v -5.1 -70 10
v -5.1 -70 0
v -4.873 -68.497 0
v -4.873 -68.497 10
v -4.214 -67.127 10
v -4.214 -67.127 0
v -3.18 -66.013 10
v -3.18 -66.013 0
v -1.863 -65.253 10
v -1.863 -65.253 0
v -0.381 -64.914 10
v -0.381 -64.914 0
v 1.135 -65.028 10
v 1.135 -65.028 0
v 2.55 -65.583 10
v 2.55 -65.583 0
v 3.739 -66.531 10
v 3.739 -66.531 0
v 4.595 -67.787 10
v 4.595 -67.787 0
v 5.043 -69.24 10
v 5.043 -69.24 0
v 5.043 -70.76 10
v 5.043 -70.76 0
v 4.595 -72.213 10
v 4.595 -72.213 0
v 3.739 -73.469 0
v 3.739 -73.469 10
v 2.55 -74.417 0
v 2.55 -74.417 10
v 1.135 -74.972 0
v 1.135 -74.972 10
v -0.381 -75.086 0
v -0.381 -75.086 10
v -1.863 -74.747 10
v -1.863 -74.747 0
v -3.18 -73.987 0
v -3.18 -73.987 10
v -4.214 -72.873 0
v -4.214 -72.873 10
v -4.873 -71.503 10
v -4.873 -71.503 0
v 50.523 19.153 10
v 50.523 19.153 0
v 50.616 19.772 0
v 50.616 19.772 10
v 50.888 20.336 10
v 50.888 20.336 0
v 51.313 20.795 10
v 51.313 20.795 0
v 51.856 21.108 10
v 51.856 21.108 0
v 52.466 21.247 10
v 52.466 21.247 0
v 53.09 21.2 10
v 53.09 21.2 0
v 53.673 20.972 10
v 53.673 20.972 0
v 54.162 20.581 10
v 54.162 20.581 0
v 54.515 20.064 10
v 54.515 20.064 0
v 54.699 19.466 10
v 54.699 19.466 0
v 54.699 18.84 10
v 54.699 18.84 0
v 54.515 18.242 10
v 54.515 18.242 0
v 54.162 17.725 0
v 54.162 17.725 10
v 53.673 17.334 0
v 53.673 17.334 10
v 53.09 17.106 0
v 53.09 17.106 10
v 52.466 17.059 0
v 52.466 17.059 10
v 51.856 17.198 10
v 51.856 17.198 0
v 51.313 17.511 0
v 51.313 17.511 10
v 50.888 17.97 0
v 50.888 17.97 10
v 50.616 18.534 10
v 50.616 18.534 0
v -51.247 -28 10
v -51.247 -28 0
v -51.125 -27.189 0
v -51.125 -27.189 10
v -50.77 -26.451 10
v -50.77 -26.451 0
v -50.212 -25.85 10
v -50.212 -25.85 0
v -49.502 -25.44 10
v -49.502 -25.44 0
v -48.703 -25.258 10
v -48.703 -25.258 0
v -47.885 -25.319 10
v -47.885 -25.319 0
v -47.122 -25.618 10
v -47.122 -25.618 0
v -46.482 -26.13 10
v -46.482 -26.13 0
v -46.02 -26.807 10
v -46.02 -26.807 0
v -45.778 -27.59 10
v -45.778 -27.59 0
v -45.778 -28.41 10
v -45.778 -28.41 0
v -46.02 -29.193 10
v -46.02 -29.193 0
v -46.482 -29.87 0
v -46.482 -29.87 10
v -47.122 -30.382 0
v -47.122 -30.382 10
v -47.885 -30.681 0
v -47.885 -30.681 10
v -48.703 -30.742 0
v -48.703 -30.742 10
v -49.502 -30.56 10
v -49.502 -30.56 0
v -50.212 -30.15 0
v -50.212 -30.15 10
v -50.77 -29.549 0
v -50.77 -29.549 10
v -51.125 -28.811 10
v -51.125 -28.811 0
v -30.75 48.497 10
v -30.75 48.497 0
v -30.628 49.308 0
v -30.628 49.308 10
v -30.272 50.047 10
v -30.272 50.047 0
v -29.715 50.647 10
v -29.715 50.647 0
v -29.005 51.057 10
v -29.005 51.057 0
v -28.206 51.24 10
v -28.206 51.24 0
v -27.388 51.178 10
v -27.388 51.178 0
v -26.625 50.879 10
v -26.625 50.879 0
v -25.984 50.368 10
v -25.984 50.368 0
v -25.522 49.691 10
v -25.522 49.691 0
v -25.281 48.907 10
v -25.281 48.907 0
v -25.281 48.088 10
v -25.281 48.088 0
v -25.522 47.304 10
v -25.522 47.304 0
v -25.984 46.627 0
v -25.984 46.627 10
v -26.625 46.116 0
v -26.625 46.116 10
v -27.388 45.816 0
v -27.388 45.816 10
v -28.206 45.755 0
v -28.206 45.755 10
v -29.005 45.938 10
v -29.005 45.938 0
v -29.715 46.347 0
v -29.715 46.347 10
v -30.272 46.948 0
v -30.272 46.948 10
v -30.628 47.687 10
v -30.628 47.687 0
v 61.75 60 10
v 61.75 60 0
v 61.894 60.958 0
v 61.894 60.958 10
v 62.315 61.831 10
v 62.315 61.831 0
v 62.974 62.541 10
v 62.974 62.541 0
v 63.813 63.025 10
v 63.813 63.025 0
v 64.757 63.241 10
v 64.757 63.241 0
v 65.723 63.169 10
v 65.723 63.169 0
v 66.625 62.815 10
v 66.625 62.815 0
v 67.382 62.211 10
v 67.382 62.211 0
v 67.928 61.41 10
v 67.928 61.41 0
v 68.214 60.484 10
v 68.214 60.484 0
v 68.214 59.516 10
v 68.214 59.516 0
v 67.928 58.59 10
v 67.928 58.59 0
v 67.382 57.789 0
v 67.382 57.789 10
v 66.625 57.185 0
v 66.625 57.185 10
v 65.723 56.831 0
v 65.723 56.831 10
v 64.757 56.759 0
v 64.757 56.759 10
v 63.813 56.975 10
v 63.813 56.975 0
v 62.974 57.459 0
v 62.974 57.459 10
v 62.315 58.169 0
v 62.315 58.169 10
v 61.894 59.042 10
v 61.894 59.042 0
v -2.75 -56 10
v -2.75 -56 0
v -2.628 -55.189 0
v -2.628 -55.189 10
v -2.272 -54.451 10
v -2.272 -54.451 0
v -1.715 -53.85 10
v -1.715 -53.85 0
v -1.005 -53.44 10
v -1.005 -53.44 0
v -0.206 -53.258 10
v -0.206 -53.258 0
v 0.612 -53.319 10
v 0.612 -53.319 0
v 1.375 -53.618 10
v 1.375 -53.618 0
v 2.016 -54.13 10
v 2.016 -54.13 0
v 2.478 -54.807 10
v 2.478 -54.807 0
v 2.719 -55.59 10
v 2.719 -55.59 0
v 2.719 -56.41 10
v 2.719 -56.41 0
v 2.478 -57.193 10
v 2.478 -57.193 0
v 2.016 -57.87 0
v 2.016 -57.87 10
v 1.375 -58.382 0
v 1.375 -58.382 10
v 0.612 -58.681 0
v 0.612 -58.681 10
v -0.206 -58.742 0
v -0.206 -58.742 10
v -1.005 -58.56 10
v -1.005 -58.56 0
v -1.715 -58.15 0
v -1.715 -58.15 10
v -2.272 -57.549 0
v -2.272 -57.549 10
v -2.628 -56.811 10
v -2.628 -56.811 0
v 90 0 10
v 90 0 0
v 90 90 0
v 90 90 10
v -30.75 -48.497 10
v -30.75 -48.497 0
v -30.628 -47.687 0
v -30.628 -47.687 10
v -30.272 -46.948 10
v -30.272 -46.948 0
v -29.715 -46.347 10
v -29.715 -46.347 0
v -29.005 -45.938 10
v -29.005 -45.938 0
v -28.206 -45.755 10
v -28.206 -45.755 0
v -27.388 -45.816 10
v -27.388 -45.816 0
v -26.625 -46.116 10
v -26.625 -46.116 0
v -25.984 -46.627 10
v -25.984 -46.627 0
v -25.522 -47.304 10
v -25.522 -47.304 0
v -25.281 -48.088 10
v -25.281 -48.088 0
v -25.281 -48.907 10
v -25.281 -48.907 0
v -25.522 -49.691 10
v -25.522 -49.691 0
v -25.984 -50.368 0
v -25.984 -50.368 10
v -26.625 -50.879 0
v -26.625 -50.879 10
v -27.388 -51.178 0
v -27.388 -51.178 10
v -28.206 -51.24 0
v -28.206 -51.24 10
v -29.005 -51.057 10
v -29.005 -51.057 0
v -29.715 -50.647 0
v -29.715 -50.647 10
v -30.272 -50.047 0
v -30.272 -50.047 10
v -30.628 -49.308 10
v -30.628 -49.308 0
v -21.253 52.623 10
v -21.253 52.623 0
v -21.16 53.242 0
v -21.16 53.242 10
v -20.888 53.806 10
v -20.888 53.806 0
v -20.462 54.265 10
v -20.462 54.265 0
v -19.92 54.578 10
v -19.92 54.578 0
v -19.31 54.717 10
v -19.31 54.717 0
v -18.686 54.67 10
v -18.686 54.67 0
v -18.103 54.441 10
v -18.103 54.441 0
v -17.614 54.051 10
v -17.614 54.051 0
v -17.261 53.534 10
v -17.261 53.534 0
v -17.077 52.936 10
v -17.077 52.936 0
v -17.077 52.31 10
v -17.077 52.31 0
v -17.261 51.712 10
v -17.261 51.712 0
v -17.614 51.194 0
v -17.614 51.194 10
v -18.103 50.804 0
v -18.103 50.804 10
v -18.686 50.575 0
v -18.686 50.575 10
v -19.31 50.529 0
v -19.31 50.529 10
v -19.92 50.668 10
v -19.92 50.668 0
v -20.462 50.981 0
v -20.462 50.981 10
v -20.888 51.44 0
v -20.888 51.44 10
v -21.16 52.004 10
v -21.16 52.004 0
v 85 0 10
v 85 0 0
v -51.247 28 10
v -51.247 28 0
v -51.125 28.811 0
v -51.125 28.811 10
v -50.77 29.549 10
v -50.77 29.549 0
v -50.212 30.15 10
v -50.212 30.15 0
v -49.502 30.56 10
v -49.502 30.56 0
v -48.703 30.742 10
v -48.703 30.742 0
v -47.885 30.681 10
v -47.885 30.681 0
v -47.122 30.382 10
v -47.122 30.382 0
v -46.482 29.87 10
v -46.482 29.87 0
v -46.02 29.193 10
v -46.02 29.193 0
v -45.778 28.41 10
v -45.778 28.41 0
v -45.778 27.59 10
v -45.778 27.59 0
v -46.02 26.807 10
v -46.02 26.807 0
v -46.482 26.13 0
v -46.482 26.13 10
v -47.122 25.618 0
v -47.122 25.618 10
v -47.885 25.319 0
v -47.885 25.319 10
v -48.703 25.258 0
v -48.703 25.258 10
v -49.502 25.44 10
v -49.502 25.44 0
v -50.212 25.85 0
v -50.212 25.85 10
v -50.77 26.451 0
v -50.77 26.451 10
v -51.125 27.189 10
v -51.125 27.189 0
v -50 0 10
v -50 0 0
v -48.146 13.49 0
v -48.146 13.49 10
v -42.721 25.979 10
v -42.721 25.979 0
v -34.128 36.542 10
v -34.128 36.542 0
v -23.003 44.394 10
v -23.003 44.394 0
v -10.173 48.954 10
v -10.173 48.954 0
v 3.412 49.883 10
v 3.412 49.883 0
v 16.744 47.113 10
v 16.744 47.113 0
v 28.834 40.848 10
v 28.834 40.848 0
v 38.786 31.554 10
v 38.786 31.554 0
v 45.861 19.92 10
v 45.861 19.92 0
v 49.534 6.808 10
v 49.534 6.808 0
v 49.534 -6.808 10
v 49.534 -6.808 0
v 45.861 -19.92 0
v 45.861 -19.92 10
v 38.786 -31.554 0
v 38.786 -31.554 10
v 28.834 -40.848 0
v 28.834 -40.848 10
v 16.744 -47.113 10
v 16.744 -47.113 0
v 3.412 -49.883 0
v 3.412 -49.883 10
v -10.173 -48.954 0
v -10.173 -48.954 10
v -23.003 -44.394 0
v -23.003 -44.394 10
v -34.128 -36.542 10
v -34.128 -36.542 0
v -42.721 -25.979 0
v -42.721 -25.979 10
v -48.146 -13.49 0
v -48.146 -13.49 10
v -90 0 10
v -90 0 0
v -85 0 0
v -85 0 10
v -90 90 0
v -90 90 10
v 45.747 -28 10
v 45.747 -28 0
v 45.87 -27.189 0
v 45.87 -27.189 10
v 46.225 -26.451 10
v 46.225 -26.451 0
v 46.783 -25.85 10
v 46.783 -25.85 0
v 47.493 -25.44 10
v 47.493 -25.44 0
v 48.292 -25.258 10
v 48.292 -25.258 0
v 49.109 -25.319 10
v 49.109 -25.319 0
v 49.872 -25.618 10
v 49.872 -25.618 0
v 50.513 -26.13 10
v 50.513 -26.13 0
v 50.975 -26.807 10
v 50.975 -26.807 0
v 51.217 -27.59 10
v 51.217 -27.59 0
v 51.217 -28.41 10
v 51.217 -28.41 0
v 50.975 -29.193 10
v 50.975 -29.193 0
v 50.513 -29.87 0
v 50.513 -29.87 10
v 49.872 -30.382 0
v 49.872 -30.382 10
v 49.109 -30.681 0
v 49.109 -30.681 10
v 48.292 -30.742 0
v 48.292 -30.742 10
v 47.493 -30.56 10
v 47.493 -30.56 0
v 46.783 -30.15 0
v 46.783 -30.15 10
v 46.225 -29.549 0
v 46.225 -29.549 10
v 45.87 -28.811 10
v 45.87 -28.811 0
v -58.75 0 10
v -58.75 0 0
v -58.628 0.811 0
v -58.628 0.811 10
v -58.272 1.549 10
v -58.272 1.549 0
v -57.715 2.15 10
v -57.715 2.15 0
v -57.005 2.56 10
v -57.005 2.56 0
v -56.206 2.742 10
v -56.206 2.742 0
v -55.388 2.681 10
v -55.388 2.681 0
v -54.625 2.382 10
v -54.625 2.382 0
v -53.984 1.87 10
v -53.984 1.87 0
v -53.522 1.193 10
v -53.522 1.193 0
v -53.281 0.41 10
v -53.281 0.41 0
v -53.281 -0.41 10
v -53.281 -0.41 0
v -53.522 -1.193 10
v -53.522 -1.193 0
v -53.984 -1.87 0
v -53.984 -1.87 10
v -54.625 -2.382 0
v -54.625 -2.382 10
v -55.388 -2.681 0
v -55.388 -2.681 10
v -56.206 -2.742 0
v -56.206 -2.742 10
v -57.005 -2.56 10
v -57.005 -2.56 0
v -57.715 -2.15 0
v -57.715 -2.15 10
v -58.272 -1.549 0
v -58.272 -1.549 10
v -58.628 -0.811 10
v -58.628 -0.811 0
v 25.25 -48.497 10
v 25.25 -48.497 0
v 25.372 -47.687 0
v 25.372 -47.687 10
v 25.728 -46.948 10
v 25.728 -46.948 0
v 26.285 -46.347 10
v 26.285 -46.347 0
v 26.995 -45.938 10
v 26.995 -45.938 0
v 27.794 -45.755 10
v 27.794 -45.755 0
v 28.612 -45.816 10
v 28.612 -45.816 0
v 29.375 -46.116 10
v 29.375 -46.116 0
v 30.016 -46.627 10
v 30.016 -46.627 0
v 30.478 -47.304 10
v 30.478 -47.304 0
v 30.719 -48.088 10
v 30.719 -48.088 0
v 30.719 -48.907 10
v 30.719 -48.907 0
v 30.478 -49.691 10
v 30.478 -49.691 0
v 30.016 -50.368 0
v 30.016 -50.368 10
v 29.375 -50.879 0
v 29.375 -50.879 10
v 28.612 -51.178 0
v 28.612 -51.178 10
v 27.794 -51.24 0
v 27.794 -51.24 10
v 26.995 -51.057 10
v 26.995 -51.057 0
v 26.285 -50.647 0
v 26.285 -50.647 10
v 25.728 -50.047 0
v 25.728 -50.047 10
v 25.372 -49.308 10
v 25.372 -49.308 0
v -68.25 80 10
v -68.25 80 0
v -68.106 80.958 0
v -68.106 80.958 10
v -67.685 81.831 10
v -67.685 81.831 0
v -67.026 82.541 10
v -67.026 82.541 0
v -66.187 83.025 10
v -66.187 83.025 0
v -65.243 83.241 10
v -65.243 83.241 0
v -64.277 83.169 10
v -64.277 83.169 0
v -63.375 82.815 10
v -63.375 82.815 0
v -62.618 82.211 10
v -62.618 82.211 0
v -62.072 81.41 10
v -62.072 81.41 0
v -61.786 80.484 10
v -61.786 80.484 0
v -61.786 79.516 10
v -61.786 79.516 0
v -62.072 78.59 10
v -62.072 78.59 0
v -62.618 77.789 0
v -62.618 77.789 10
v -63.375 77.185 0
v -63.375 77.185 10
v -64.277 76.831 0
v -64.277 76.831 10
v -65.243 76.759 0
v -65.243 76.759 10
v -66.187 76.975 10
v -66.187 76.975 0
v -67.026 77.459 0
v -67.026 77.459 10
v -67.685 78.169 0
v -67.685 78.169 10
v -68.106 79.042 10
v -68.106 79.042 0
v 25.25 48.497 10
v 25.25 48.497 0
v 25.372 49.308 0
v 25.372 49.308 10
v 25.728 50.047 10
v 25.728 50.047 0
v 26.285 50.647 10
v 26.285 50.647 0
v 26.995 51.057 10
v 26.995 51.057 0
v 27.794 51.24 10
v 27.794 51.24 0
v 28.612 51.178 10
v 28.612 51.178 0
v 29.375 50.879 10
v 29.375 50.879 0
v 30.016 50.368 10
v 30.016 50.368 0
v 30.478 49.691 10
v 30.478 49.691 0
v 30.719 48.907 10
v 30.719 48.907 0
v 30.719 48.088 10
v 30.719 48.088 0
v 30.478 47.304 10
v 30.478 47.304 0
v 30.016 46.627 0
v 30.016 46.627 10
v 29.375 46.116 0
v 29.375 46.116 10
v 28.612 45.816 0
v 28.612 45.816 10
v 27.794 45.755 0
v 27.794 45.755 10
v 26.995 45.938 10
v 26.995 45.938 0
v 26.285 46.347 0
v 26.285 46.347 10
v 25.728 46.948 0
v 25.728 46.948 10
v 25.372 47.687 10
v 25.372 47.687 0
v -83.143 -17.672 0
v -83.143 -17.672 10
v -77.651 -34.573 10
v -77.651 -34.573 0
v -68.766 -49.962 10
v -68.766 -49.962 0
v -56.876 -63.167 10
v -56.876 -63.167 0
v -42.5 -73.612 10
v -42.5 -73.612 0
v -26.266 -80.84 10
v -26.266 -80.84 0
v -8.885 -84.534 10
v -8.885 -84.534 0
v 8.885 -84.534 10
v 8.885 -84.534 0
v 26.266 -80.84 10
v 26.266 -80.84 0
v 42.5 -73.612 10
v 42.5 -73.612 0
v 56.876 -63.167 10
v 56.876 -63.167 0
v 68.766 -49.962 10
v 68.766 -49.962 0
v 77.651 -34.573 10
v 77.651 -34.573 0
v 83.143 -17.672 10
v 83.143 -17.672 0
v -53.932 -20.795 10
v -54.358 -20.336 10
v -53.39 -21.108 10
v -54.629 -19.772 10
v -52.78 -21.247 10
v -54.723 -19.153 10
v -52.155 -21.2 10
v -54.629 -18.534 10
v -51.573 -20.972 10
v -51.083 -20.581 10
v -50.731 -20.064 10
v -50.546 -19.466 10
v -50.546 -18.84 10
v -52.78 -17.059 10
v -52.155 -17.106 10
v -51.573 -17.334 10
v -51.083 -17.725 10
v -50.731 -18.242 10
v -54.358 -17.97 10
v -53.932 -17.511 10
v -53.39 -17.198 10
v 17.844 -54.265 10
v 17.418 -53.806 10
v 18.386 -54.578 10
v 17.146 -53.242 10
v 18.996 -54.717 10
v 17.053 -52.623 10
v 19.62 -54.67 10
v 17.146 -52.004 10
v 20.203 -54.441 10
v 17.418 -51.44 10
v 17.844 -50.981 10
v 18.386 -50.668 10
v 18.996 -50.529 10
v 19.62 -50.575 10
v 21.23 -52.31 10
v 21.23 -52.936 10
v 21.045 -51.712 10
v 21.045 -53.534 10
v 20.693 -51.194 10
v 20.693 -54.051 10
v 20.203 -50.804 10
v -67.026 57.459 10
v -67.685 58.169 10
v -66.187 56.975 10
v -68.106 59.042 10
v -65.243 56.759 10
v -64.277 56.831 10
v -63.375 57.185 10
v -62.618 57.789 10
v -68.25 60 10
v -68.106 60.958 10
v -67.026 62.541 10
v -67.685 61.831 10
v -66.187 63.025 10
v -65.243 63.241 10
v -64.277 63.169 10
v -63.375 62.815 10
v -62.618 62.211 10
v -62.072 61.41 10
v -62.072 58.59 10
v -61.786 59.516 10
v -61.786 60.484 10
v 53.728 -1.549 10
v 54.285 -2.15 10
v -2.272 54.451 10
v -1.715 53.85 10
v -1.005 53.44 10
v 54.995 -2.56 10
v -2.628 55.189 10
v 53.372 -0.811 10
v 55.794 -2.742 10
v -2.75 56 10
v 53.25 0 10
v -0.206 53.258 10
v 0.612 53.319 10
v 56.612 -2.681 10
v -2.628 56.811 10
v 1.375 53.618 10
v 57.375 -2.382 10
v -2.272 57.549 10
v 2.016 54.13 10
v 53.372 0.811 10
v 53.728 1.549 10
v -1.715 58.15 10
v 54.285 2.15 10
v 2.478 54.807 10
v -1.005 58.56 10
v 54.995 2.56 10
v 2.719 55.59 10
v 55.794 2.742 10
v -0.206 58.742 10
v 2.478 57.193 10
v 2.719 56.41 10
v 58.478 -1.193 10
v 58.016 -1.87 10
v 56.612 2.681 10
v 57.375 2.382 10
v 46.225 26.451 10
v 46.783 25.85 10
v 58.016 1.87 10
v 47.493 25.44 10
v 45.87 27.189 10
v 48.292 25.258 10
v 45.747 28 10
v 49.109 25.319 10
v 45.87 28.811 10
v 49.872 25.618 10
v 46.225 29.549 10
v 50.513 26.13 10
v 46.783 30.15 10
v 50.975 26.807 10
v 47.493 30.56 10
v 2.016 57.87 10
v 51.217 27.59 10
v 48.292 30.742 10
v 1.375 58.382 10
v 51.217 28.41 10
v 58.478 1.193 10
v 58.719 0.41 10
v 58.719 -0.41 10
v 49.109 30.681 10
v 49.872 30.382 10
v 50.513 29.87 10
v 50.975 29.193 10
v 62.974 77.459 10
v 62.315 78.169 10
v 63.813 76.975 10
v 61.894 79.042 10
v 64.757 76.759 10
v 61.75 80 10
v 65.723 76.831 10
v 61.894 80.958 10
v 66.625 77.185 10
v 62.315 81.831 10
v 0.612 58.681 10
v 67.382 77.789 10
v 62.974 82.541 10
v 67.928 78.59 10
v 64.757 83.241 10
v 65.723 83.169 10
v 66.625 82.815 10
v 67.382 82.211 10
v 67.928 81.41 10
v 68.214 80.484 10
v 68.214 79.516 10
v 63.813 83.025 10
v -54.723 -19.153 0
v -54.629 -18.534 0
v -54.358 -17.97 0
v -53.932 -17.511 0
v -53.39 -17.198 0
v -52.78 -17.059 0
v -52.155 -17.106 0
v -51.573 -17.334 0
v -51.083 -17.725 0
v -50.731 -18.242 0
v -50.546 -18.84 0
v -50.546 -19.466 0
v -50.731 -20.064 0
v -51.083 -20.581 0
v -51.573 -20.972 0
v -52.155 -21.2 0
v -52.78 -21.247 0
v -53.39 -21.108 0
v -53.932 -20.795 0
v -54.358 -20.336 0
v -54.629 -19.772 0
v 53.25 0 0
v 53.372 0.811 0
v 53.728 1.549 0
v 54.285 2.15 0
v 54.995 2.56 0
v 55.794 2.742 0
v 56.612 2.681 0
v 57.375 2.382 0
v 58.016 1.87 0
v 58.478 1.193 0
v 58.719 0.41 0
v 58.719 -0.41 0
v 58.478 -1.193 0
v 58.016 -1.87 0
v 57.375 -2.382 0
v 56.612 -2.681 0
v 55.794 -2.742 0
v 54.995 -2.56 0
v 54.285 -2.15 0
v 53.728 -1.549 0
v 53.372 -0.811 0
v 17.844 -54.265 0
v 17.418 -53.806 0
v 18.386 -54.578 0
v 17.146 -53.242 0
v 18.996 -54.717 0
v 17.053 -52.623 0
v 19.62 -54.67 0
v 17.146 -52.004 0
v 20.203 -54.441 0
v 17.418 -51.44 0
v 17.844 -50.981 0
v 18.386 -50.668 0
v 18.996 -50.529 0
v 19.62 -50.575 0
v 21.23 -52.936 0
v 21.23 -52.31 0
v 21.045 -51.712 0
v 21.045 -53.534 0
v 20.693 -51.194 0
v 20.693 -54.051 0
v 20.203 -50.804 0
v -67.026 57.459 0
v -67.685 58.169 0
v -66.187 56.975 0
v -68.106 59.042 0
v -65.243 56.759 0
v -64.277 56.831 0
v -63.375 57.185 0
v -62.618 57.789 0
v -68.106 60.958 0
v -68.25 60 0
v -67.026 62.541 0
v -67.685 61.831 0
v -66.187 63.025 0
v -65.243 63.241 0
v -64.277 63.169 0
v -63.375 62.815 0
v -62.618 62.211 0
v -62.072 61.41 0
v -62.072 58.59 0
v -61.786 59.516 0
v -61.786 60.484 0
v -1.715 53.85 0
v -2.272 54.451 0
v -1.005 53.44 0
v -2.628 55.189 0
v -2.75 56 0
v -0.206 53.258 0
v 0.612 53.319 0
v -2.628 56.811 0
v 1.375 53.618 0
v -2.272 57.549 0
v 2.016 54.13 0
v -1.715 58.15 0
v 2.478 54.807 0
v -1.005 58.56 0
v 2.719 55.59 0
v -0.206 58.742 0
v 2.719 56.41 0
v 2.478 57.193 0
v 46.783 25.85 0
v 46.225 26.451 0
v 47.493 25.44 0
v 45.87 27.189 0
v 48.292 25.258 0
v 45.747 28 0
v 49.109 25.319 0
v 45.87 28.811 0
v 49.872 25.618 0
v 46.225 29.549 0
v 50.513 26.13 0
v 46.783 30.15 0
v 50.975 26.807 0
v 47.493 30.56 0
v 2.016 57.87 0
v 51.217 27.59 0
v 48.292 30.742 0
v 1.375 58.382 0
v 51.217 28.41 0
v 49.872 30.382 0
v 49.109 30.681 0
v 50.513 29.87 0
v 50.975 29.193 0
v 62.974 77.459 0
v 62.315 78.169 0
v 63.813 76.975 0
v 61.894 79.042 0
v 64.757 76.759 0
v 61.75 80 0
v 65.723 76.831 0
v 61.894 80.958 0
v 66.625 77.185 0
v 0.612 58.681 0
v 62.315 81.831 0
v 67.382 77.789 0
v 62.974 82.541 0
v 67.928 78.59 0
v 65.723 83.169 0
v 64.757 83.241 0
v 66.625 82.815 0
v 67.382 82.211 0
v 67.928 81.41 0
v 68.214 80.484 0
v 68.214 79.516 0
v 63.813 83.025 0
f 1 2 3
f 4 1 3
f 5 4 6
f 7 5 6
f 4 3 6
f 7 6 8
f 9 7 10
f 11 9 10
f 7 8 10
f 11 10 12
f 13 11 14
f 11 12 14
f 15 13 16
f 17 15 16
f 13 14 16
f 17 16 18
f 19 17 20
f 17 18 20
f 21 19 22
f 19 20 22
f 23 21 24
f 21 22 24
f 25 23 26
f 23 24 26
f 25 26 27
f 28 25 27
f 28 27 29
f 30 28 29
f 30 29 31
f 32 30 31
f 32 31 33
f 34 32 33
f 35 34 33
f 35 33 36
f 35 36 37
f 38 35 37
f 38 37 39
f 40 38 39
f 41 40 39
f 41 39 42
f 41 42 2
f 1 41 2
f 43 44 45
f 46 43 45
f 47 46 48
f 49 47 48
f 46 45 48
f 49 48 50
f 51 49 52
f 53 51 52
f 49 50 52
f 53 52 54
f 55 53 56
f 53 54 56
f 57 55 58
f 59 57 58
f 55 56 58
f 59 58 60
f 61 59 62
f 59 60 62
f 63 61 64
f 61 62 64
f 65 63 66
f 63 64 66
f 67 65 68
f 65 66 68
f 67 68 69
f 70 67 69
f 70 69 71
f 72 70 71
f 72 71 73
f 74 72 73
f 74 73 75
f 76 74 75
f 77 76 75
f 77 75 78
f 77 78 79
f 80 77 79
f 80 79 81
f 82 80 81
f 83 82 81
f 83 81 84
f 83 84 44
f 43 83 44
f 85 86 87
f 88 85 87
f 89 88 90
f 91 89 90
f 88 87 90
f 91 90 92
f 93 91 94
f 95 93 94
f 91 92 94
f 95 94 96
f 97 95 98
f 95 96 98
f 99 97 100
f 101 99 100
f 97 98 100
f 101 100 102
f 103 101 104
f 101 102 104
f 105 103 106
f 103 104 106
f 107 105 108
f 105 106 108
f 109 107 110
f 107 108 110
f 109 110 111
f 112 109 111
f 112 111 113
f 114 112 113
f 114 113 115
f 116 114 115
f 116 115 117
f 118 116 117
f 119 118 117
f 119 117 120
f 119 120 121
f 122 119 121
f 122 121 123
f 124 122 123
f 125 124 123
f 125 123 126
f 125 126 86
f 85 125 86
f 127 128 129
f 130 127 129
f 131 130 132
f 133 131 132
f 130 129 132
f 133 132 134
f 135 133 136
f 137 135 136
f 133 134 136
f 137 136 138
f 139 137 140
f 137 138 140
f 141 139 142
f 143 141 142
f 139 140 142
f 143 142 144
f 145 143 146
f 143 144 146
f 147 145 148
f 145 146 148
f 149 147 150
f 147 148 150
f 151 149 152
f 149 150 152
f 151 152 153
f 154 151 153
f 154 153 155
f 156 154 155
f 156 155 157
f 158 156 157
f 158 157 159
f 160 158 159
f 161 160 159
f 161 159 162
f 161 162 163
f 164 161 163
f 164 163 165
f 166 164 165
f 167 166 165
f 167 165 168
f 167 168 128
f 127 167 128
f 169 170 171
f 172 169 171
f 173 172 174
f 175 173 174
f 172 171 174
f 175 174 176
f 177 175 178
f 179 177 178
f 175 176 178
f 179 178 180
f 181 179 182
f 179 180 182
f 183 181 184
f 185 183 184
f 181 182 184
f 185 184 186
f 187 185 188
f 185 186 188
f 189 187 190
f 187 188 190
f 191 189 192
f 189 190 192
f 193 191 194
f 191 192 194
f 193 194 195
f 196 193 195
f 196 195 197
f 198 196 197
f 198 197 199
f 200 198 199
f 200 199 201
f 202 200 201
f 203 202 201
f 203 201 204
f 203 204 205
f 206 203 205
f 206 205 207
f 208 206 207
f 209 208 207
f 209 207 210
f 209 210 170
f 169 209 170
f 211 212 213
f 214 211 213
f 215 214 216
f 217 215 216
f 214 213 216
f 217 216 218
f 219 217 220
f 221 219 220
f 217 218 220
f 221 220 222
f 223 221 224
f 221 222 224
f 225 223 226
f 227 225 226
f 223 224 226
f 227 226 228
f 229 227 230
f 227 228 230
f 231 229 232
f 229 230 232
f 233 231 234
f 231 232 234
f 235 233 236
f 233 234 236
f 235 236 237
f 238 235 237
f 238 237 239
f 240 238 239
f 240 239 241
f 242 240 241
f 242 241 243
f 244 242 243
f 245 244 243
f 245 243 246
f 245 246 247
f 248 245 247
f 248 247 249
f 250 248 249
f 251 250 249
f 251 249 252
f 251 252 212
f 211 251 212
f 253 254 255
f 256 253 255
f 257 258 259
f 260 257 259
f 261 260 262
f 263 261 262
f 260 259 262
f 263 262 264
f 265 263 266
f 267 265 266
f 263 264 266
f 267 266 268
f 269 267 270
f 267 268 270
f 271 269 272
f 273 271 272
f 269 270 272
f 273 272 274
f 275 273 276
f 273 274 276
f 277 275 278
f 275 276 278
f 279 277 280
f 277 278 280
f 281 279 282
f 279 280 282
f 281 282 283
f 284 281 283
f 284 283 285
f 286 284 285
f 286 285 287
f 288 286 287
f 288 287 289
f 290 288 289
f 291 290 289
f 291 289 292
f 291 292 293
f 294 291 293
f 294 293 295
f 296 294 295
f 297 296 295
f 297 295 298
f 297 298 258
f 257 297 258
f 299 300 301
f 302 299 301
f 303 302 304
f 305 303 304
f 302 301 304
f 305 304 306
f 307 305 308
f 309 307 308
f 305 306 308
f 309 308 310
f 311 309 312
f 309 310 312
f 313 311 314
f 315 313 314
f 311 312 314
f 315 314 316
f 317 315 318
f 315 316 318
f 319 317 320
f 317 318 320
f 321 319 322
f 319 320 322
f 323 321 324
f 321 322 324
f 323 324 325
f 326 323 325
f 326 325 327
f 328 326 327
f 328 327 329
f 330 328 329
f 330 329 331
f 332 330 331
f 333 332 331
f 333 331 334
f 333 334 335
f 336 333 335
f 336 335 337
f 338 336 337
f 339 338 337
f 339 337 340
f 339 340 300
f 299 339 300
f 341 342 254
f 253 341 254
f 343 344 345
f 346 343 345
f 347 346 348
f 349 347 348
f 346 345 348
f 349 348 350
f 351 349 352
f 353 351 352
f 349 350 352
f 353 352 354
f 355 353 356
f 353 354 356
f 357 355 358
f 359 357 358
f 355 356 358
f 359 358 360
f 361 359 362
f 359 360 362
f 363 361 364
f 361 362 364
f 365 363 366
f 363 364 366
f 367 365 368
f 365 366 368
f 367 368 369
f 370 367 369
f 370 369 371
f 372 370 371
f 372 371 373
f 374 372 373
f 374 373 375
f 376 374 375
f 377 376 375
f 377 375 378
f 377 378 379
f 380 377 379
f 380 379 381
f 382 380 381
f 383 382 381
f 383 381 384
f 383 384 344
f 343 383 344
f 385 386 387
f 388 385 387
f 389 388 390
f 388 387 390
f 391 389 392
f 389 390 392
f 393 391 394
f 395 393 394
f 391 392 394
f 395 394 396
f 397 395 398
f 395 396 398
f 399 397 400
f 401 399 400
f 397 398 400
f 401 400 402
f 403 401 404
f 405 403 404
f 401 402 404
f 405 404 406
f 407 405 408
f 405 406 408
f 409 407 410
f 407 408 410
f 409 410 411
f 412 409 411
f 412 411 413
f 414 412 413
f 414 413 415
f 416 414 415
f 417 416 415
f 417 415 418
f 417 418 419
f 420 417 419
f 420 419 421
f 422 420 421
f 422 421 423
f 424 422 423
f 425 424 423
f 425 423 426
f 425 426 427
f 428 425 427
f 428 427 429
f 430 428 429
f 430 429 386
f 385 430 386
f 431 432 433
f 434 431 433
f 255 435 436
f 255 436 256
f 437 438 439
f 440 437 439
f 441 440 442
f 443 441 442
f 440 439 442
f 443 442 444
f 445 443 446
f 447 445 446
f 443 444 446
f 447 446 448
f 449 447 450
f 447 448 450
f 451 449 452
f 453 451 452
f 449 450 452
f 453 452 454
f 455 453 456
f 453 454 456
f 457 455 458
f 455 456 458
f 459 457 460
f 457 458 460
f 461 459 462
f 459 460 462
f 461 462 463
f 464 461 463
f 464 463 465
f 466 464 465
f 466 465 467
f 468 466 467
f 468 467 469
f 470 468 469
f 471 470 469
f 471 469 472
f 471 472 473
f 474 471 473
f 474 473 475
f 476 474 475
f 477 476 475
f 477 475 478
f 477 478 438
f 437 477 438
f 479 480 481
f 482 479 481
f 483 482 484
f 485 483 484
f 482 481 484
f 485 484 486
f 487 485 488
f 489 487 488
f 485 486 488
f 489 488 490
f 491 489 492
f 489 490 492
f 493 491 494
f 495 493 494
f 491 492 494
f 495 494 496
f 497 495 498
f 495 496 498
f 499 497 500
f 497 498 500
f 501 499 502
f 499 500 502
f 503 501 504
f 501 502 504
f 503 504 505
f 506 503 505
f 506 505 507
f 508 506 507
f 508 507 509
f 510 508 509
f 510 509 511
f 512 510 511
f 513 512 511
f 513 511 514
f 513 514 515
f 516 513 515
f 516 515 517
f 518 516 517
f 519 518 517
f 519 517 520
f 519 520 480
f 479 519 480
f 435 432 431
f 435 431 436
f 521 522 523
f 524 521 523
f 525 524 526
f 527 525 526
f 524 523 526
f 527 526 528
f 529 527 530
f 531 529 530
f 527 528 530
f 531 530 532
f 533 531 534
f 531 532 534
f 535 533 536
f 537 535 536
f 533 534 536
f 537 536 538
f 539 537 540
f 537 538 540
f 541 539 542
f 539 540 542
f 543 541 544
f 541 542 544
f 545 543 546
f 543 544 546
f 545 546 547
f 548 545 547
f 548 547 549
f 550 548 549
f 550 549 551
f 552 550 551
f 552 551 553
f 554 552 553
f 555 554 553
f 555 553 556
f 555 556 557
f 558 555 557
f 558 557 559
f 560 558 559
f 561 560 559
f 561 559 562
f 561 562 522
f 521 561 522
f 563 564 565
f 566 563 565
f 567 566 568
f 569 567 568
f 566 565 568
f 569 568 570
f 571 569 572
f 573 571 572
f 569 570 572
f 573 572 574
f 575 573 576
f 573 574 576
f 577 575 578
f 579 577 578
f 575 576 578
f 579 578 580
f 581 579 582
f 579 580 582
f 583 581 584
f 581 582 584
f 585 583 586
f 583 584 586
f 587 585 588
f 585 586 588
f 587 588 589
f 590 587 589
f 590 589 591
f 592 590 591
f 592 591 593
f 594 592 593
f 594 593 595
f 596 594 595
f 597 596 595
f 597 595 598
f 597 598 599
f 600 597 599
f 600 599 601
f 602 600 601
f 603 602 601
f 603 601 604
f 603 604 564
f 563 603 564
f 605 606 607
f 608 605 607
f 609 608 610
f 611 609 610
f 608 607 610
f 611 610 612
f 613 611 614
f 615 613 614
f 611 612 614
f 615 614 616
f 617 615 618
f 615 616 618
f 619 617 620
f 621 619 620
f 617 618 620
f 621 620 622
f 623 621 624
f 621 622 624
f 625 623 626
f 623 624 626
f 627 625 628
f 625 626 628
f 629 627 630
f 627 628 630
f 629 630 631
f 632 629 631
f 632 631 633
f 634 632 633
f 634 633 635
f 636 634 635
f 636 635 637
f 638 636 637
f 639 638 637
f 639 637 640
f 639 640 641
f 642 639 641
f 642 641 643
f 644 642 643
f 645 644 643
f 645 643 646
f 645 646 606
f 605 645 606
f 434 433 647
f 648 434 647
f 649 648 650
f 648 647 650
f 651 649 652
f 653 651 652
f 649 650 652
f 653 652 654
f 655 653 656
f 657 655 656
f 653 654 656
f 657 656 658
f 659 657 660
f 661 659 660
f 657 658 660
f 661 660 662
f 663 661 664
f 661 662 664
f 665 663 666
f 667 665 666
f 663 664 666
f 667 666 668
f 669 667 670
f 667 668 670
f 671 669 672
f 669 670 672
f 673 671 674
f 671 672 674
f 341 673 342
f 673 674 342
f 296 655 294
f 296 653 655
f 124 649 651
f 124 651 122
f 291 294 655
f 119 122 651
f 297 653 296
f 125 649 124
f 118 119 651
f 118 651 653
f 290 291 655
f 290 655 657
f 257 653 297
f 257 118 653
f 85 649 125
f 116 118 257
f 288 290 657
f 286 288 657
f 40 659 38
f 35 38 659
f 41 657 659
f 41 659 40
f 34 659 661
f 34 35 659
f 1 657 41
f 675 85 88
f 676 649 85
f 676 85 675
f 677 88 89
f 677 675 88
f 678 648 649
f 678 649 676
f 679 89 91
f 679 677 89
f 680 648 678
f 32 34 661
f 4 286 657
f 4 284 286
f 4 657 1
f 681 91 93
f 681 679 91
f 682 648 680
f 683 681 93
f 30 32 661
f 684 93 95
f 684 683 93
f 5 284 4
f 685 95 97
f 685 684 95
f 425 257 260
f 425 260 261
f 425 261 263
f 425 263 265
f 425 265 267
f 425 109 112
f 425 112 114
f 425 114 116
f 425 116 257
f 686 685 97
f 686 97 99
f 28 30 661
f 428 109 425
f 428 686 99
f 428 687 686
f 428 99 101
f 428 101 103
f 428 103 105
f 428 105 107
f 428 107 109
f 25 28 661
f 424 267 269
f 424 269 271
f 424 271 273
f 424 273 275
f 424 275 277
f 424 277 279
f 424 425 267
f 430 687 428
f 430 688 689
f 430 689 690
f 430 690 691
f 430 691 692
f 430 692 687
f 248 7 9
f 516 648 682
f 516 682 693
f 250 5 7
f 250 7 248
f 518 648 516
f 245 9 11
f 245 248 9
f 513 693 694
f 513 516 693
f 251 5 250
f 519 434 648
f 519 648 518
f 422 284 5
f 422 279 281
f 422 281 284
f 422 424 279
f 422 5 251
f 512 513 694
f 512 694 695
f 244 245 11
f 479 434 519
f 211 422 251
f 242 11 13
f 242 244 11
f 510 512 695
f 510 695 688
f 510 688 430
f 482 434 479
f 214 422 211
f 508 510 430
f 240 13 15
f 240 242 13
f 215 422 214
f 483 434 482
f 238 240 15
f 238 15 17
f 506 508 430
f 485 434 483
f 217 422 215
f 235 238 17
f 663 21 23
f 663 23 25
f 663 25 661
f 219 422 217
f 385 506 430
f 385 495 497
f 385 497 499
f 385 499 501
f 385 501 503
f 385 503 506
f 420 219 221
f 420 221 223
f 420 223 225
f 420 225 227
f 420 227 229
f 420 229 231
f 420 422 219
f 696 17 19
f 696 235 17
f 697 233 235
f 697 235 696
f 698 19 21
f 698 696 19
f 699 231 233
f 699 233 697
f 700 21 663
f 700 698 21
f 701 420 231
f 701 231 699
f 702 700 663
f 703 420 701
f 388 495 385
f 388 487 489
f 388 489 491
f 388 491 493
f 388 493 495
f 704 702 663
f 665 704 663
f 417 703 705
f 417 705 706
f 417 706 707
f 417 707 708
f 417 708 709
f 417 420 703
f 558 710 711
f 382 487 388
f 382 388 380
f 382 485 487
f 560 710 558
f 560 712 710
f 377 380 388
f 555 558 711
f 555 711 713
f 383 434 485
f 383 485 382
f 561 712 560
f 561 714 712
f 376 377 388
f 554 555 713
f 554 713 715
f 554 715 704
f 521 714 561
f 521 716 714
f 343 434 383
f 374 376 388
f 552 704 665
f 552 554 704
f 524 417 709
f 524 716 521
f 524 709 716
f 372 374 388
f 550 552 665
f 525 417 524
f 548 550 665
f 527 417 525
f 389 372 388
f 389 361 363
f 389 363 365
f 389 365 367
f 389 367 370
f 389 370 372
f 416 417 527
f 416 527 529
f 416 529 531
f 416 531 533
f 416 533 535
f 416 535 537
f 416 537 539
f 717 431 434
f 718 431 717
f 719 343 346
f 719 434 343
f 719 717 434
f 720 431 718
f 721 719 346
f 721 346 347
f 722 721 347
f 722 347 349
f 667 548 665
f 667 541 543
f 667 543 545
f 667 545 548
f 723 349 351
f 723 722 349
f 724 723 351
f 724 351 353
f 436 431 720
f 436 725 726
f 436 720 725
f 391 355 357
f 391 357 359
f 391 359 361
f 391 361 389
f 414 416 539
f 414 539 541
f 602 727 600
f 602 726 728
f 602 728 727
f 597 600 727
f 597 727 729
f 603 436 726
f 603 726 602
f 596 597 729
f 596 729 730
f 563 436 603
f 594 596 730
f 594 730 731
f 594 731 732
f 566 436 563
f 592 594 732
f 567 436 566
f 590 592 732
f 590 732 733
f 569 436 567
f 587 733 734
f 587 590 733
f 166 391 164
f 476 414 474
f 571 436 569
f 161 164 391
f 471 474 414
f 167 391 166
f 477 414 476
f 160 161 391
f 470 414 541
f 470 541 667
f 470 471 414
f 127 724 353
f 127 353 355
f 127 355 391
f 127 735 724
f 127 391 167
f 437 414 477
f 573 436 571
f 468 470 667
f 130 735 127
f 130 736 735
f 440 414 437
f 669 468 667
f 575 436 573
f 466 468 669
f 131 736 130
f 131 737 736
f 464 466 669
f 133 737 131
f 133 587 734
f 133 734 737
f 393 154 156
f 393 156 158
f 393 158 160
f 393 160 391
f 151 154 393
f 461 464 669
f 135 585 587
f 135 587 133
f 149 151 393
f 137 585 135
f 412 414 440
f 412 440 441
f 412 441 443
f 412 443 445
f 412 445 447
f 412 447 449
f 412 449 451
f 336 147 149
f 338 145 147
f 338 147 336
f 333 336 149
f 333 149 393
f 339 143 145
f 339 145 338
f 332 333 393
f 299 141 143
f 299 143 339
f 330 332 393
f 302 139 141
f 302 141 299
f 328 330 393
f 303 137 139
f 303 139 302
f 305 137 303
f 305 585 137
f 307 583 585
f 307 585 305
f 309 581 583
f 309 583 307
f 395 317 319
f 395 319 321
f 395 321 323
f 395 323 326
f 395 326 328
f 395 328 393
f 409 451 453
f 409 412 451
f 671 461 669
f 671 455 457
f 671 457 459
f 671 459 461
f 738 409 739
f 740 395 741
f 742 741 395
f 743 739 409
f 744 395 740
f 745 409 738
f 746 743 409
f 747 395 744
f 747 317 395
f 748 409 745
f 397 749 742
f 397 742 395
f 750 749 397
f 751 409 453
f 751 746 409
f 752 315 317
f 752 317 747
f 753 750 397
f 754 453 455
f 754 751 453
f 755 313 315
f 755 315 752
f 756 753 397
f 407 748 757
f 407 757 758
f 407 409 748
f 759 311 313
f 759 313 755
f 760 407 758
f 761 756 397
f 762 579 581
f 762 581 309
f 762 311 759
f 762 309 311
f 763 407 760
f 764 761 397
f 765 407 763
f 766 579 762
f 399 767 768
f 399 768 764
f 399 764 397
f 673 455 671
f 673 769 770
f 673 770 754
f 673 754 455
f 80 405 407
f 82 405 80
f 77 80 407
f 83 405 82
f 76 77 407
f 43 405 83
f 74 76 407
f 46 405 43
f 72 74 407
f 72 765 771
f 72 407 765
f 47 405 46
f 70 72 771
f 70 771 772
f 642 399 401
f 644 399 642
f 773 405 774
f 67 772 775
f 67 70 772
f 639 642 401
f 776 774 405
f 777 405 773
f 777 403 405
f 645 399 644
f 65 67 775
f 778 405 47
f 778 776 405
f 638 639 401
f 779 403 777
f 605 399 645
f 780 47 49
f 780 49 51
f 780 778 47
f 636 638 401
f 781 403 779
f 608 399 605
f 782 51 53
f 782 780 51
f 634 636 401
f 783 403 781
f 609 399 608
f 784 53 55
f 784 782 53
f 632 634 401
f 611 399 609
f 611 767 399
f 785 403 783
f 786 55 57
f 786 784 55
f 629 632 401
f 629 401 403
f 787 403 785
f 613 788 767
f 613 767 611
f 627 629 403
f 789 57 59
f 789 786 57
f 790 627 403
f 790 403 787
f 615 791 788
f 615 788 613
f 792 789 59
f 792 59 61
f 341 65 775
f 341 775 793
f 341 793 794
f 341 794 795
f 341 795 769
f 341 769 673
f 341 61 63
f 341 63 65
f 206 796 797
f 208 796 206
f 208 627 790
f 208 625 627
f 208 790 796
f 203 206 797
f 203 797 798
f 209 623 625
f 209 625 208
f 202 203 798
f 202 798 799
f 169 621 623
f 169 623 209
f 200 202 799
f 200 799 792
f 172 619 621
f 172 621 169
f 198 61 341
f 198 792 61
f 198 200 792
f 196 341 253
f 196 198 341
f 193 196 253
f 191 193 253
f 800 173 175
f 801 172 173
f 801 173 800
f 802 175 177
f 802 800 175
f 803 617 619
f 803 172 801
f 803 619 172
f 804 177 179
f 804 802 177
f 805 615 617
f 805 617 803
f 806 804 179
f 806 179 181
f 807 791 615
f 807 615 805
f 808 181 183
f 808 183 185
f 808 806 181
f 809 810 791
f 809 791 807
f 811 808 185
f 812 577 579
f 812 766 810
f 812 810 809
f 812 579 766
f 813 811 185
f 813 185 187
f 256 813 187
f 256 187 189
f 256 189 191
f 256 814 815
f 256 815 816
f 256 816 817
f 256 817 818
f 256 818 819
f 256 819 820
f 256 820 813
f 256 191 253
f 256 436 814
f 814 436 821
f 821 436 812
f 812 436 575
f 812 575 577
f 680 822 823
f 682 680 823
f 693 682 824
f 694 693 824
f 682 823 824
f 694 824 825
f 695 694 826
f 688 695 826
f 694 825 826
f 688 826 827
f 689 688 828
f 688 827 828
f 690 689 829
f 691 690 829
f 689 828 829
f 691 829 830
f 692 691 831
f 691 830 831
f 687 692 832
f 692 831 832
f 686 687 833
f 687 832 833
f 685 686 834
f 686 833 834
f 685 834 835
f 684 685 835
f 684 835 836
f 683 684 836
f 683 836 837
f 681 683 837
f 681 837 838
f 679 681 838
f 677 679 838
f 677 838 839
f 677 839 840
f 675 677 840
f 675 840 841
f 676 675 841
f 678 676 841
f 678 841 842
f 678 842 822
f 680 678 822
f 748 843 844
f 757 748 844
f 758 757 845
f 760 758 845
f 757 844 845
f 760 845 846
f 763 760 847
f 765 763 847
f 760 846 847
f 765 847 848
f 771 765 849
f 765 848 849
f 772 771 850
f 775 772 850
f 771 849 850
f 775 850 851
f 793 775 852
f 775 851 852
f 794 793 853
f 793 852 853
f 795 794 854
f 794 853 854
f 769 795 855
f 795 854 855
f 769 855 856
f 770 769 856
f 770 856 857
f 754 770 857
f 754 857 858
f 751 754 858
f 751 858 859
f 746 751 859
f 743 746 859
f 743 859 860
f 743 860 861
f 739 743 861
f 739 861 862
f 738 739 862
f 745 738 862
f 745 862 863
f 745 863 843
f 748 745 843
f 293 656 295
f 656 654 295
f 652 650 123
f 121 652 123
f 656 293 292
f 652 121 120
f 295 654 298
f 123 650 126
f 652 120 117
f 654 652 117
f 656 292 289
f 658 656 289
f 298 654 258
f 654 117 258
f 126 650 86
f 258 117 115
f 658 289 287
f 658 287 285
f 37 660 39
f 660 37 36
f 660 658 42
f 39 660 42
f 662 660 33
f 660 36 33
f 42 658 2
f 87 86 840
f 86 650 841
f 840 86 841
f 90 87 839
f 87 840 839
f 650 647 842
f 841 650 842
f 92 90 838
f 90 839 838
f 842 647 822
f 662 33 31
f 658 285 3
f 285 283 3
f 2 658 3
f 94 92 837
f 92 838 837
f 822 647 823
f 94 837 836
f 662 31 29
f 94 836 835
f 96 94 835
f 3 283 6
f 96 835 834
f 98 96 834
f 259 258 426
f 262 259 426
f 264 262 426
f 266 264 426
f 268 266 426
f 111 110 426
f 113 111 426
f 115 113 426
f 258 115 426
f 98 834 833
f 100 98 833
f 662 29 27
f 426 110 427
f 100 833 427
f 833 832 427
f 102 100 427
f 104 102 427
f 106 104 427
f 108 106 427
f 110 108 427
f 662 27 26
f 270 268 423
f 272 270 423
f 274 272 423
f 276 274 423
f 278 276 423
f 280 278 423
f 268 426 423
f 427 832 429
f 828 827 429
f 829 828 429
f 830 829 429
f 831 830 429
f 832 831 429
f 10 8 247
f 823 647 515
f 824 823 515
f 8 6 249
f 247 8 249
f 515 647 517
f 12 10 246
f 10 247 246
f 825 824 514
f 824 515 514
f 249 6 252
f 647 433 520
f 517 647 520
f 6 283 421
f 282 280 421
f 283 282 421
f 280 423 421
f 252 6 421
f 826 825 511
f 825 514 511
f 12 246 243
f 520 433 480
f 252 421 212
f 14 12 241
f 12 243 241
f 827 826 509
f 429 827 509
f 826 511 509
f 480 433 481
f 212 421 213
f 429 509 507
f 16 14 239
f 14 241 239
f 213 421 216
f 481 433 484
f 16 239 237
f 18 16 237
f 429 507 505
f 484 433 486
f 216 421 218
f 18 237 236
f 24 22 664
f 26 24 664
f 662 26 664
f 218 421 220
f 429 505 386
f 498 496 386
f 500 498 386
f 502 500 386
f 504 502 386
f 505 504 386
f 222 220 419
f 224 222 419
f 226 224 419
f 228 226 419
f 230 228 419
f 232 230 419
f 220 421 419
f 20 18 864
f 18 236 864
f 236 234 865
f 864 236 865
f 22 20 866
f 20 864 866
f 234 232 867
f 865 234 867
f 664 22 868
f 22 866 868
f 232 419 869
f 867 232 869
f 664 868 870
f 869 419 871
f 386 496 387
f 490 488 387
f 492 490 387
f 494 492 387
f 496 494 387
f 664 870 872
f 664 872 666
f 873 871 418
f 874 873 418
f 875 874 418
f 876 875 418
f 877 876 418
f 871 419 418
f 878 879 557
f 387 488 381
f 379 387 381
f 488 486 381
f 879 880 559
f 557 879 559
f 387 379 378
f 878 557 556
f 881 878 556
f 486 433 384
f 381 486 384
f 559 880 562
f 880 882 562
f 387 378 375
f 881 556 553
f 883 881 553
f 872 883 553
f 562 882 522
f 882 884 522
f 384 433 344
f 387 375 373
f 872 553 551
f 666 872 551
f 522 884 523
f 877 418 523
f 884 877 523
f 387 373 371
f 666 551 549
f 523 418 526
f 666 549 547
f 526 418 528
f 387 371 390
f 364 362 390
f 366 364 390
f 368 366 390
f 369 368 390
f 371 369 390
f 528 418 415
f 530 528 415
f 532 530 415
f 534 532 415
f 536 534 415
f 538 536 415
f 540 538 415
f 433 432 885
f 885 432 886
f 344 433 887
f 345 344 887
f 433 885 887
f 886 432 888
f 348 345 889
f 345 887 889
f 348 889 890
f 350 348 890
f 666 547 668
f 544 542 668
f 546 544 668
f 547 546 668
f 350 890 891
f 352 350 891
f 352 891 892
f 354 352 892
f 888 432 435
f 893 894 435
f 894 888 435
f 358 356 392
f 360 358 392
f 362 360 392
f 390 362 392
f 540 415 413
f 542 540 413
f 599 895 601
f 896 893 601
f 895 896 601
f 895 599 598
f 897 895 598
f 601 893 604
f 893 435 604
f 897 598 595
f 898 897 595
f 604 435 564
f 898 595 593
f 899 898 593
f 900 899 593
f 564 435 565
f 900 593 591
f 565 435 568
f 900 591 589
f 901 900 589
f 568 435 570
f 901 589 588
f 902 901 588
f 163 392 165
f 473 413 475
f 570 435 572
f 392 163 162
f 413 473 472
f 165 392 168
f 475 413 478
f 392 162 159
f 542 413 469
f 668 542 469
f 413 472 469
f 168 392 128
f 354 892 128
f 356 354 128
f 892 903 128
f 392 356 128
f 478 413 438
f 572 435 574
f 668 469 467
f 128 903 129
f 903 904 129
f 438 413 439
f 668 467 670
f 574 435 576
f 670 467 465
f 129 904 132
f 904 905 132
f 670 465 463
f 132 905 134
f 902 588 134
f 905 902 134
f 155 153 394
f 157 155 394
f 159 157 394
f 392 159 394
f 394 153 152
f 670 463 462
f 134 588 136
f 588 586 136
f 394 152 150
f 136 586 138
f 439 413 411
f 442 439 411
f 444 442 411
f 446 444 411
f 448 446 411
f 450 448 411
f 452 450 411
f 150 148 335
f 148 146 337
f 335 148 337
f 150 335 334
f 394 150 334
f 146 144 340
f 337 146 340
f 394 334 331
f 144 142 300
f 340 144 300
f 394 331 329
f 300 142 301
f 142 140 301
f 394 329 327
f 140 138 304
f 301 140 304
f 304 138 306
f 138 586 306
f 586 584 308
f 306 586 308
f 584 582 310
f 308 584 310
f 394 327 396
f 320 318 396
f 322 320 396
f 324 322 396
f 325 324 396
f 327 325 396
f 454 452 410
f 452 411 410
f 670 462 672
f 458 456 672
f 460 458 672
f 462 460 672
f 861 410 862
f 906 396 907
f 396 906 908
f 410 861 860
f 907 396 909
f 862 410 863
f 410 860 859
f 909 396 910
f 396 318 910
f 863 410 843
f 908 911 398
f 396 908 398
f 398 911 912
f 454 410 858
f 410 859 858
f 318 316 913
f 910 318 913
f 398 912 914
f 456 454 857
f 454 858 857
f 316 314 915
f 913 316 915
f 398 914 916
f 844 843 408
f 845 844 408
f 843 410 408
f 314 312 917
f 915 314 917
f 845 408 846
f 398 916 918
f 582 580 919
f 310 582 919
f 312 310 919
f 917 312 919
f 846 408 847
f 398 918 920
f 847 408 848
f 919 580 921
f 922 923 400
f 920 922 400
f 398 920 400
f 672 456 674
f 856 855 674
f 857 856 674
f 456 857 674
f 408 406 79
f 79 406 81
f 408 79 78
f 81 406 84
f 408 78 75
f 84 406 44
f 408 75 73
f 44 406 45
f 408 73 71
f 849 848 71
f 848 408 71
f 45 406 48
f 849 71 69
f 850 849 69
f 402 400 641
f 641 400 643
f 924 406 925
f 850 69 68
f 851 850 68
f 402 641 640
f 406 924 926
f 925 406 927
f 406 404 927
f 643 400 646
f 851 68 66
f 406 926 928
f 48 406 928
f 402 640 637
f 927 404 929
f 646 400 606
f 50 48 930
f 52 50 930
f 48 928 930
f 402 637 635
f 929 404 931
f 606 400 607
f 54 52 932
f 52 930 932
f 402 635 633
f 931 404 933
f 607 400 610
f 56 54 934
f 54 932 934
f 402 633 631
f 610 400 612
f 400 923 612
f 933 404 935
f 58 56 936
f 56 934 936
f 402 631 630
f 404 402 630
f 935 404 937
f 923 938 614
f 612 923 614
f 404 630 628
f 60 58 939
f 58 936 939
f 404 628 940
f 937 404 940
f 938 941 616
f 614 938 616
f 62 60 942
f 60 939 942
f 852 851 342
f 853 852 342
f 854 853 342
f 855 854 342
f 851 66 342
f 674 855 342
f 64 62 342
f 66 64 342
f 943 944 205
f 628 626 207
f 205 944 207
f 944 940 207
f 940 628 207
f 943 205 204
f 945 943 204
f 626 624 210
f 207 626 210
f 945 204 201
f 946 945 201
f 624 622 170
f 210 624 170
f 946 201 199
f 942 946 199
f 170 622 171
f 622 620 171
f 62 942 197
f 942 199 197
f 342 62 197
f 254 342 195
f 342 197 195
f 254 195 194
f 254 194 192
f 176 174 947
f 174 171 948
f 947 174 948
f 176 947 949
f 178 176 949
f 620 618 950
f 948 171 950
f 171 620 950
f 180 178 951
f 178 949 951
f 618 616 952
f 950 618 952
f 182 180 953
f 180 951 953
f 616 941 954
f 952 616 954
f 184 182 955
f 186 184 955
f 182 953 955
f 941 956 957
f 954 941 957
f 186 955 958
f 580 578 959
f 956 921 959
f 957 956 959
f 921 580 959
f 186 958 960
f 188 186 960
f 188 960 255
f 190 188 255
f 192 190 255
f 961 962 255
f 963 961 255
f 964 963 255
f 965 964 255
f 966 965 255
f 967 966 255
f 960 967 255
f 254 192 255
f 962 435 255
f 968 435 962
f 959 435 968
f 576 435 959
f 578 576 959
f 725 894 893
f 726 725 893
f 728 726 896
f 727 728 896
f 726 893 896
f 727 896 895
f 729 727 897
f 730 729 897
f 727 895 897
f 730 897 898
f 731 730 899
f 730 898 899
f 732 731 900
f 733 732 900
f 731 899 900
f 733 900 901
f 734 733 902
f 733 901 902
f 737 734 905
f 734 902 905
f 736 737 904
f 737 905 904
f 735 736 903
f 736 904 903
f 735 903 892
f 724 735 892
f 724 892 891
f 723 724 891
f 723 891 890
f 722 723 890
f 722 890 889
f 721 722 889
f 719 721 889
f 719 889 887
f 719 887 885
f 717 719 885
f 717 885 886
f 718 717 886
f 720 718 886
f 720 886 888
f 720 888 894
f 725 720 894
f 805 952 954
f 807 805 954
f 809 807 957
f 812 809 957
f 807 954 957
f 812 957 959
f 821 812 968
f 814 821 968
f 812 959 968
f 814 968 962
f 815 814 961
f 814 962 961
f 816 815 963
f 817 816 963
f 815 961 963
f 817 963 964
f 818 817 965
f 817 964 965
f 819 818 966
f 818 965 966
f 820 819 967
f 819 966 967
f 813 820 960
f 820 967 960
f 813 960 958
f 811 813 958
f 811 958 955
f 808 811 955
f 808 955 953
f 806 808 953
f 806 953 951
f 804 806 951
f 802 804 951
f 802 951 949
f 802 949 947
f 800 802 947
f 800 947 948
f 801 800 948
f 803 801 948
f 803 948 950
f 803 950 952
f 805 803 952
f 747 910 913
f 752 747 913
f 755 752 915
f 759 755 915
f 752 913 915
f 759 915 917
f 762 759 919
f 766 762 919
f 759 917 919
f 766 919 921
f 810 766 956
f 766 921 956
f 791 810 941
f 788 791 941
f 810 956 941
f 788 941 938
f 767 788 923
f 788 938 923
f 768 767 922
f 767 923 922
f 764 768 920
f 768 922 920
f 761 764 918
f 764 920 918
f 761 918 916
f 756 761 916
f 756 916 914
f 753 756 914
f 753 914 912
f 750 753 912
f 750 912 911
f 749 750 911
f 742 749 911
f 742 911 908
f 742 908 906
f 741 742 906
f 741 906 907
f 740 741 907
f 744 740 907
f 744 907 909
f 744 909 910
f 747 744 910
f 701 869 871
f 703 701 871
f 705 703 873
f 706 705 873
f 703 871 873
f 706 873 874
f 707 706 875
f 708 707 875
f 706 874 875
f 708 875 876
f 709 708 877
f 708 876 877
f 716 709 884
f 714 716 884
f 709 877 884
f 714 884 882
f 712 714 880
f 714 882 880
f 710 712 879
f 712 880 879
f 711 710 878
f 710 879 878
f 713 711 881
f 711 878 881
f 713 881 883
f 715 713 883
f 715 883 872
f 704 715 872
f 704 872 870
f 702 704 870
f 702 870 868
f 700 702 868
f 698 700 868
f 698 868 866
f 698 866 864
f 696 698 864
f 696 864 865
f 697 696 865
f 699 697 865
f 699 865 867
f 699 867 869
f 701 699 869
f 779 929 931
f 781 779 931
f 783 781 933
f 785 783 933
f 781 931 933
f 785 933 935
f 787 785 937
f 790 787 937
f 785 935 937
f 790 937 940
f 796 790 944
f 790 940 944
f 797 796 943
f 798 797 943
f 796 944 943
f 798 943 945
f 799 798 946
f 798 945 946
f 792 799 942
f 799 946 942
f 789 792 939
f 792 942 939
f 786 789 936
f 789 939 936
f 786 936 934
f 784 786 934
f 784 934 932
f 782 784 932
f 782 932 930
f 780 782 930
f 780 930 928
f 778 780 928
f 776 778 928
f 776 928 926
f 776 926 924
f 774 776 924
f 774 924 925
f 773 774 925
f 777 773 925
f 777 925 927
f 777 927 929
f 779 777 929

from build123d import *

# Parameters (mm, degrees)
SKETCH_1_R          = 85
EXTRUDE_1_DEPTH     = 10
SKETCH_2_W          = 180
SKETCH_2_H          = 90
EXTRUDE_2_DEPTH     = 10
SKETCH_3_R          = 50
SKETCH_3_R_2        = 2.75
SKETCH_3_R_3        = 2.1
SKETCH_3_R_4        = 5.1
SKETCH_3_R_5        = 3.25
CUT_EXTRUDE_1_DEPTH = 11


with BuildPart() as part:
    # 草图1 → 凸台-拉伸1 (new body)
    with BuildSketch(Plane.XY):
        Circle(SKETCH_1_R)
    extrude(amount=EXTRUDE_1_DEPTH)

    # 草图2 → 凸台-拉伸2 (add)
    with BuildSketch(Plane.XY):
        with Locations((0, 45)):
            Rectangle(SKETCH_2_W, SKETCH_2_H)
    extrude(amount=EXTRUDE_2_DEPTH)

    # 草图3 → 切除-拉伸1 (cut)
    with BuildSketch(Plane(origin=(0, 0, 0), x_dir=(-1, 0, 0), z_dir=(0, 0, -1))):
        Circle(SKETCH_3_R)
        with Locations((-56, 0)):
            Circle(SKETCH_3_R_2)
        with Locations((-48.497422612, 28)):
            Circle(SKETCH_3_R_2)
        with Locations((-28, 48.497422612)):
            Circle(SKETCH_3_R_2)
        with Locations((0, 56)):
            Circle(SKETCH_3_R_2)
        with Locations((28, 48.497422612)):
            Circle(SKETCH_3_R_2)
        with Locations((48.497422612, 28)):
            Circle(SKETCH_3_R_2)
        with Locations((56, 0)):
            Circle(SKETCH_3_R_2)
        with Locations((48.497422612, -28)):
            Circle(SKETCH_3_R_2)
        with Locations((28, -48.497422612)):
            Circle(SKETCH_3_R_2)
        with Locations((0, -56)):
            Circle(SKETCH_3_R_2)
        with Locations((-28, -48.497422612)):
            Circle(SKETCH_3_R_2)
        with Locations((-48.497422612, -28)):
            Circle(SKETCH_3_R_2)
        with Locations((-52.622786764, 19.153128026)):
            Circle(SKETCH_3_R_3)
        with Locations((19.153128026, 52.622786764)):
            Circle(SKETCH_3_R_3)
        with Locations((52.622786764, -19.153128026)):
            Circle(SKETCH_3_R_3)
        with Locations((-19.153128026, -52.622786764)):
            Circle(SKETCH_3_R_3)
        with Locations((0, -70)):
            Circle(SKETCH_3_R_4)
        with Locations((65, 60)):
            Circle(SKETCH_3_R_5)
        with Locations((65, 80)):
            Circle(SKETCH_3_R_5)
        with Locations((-65, 60)):
            Circle(SKETCH_3_R_5)
        with Locations((-65, 80)):
            Circle(SKETCH_3_R_5)
    extrude(amount=-CUT_EXTRUDE_1_DEPTH, mode=Mode.SUBTRACT)


solid = part.part
